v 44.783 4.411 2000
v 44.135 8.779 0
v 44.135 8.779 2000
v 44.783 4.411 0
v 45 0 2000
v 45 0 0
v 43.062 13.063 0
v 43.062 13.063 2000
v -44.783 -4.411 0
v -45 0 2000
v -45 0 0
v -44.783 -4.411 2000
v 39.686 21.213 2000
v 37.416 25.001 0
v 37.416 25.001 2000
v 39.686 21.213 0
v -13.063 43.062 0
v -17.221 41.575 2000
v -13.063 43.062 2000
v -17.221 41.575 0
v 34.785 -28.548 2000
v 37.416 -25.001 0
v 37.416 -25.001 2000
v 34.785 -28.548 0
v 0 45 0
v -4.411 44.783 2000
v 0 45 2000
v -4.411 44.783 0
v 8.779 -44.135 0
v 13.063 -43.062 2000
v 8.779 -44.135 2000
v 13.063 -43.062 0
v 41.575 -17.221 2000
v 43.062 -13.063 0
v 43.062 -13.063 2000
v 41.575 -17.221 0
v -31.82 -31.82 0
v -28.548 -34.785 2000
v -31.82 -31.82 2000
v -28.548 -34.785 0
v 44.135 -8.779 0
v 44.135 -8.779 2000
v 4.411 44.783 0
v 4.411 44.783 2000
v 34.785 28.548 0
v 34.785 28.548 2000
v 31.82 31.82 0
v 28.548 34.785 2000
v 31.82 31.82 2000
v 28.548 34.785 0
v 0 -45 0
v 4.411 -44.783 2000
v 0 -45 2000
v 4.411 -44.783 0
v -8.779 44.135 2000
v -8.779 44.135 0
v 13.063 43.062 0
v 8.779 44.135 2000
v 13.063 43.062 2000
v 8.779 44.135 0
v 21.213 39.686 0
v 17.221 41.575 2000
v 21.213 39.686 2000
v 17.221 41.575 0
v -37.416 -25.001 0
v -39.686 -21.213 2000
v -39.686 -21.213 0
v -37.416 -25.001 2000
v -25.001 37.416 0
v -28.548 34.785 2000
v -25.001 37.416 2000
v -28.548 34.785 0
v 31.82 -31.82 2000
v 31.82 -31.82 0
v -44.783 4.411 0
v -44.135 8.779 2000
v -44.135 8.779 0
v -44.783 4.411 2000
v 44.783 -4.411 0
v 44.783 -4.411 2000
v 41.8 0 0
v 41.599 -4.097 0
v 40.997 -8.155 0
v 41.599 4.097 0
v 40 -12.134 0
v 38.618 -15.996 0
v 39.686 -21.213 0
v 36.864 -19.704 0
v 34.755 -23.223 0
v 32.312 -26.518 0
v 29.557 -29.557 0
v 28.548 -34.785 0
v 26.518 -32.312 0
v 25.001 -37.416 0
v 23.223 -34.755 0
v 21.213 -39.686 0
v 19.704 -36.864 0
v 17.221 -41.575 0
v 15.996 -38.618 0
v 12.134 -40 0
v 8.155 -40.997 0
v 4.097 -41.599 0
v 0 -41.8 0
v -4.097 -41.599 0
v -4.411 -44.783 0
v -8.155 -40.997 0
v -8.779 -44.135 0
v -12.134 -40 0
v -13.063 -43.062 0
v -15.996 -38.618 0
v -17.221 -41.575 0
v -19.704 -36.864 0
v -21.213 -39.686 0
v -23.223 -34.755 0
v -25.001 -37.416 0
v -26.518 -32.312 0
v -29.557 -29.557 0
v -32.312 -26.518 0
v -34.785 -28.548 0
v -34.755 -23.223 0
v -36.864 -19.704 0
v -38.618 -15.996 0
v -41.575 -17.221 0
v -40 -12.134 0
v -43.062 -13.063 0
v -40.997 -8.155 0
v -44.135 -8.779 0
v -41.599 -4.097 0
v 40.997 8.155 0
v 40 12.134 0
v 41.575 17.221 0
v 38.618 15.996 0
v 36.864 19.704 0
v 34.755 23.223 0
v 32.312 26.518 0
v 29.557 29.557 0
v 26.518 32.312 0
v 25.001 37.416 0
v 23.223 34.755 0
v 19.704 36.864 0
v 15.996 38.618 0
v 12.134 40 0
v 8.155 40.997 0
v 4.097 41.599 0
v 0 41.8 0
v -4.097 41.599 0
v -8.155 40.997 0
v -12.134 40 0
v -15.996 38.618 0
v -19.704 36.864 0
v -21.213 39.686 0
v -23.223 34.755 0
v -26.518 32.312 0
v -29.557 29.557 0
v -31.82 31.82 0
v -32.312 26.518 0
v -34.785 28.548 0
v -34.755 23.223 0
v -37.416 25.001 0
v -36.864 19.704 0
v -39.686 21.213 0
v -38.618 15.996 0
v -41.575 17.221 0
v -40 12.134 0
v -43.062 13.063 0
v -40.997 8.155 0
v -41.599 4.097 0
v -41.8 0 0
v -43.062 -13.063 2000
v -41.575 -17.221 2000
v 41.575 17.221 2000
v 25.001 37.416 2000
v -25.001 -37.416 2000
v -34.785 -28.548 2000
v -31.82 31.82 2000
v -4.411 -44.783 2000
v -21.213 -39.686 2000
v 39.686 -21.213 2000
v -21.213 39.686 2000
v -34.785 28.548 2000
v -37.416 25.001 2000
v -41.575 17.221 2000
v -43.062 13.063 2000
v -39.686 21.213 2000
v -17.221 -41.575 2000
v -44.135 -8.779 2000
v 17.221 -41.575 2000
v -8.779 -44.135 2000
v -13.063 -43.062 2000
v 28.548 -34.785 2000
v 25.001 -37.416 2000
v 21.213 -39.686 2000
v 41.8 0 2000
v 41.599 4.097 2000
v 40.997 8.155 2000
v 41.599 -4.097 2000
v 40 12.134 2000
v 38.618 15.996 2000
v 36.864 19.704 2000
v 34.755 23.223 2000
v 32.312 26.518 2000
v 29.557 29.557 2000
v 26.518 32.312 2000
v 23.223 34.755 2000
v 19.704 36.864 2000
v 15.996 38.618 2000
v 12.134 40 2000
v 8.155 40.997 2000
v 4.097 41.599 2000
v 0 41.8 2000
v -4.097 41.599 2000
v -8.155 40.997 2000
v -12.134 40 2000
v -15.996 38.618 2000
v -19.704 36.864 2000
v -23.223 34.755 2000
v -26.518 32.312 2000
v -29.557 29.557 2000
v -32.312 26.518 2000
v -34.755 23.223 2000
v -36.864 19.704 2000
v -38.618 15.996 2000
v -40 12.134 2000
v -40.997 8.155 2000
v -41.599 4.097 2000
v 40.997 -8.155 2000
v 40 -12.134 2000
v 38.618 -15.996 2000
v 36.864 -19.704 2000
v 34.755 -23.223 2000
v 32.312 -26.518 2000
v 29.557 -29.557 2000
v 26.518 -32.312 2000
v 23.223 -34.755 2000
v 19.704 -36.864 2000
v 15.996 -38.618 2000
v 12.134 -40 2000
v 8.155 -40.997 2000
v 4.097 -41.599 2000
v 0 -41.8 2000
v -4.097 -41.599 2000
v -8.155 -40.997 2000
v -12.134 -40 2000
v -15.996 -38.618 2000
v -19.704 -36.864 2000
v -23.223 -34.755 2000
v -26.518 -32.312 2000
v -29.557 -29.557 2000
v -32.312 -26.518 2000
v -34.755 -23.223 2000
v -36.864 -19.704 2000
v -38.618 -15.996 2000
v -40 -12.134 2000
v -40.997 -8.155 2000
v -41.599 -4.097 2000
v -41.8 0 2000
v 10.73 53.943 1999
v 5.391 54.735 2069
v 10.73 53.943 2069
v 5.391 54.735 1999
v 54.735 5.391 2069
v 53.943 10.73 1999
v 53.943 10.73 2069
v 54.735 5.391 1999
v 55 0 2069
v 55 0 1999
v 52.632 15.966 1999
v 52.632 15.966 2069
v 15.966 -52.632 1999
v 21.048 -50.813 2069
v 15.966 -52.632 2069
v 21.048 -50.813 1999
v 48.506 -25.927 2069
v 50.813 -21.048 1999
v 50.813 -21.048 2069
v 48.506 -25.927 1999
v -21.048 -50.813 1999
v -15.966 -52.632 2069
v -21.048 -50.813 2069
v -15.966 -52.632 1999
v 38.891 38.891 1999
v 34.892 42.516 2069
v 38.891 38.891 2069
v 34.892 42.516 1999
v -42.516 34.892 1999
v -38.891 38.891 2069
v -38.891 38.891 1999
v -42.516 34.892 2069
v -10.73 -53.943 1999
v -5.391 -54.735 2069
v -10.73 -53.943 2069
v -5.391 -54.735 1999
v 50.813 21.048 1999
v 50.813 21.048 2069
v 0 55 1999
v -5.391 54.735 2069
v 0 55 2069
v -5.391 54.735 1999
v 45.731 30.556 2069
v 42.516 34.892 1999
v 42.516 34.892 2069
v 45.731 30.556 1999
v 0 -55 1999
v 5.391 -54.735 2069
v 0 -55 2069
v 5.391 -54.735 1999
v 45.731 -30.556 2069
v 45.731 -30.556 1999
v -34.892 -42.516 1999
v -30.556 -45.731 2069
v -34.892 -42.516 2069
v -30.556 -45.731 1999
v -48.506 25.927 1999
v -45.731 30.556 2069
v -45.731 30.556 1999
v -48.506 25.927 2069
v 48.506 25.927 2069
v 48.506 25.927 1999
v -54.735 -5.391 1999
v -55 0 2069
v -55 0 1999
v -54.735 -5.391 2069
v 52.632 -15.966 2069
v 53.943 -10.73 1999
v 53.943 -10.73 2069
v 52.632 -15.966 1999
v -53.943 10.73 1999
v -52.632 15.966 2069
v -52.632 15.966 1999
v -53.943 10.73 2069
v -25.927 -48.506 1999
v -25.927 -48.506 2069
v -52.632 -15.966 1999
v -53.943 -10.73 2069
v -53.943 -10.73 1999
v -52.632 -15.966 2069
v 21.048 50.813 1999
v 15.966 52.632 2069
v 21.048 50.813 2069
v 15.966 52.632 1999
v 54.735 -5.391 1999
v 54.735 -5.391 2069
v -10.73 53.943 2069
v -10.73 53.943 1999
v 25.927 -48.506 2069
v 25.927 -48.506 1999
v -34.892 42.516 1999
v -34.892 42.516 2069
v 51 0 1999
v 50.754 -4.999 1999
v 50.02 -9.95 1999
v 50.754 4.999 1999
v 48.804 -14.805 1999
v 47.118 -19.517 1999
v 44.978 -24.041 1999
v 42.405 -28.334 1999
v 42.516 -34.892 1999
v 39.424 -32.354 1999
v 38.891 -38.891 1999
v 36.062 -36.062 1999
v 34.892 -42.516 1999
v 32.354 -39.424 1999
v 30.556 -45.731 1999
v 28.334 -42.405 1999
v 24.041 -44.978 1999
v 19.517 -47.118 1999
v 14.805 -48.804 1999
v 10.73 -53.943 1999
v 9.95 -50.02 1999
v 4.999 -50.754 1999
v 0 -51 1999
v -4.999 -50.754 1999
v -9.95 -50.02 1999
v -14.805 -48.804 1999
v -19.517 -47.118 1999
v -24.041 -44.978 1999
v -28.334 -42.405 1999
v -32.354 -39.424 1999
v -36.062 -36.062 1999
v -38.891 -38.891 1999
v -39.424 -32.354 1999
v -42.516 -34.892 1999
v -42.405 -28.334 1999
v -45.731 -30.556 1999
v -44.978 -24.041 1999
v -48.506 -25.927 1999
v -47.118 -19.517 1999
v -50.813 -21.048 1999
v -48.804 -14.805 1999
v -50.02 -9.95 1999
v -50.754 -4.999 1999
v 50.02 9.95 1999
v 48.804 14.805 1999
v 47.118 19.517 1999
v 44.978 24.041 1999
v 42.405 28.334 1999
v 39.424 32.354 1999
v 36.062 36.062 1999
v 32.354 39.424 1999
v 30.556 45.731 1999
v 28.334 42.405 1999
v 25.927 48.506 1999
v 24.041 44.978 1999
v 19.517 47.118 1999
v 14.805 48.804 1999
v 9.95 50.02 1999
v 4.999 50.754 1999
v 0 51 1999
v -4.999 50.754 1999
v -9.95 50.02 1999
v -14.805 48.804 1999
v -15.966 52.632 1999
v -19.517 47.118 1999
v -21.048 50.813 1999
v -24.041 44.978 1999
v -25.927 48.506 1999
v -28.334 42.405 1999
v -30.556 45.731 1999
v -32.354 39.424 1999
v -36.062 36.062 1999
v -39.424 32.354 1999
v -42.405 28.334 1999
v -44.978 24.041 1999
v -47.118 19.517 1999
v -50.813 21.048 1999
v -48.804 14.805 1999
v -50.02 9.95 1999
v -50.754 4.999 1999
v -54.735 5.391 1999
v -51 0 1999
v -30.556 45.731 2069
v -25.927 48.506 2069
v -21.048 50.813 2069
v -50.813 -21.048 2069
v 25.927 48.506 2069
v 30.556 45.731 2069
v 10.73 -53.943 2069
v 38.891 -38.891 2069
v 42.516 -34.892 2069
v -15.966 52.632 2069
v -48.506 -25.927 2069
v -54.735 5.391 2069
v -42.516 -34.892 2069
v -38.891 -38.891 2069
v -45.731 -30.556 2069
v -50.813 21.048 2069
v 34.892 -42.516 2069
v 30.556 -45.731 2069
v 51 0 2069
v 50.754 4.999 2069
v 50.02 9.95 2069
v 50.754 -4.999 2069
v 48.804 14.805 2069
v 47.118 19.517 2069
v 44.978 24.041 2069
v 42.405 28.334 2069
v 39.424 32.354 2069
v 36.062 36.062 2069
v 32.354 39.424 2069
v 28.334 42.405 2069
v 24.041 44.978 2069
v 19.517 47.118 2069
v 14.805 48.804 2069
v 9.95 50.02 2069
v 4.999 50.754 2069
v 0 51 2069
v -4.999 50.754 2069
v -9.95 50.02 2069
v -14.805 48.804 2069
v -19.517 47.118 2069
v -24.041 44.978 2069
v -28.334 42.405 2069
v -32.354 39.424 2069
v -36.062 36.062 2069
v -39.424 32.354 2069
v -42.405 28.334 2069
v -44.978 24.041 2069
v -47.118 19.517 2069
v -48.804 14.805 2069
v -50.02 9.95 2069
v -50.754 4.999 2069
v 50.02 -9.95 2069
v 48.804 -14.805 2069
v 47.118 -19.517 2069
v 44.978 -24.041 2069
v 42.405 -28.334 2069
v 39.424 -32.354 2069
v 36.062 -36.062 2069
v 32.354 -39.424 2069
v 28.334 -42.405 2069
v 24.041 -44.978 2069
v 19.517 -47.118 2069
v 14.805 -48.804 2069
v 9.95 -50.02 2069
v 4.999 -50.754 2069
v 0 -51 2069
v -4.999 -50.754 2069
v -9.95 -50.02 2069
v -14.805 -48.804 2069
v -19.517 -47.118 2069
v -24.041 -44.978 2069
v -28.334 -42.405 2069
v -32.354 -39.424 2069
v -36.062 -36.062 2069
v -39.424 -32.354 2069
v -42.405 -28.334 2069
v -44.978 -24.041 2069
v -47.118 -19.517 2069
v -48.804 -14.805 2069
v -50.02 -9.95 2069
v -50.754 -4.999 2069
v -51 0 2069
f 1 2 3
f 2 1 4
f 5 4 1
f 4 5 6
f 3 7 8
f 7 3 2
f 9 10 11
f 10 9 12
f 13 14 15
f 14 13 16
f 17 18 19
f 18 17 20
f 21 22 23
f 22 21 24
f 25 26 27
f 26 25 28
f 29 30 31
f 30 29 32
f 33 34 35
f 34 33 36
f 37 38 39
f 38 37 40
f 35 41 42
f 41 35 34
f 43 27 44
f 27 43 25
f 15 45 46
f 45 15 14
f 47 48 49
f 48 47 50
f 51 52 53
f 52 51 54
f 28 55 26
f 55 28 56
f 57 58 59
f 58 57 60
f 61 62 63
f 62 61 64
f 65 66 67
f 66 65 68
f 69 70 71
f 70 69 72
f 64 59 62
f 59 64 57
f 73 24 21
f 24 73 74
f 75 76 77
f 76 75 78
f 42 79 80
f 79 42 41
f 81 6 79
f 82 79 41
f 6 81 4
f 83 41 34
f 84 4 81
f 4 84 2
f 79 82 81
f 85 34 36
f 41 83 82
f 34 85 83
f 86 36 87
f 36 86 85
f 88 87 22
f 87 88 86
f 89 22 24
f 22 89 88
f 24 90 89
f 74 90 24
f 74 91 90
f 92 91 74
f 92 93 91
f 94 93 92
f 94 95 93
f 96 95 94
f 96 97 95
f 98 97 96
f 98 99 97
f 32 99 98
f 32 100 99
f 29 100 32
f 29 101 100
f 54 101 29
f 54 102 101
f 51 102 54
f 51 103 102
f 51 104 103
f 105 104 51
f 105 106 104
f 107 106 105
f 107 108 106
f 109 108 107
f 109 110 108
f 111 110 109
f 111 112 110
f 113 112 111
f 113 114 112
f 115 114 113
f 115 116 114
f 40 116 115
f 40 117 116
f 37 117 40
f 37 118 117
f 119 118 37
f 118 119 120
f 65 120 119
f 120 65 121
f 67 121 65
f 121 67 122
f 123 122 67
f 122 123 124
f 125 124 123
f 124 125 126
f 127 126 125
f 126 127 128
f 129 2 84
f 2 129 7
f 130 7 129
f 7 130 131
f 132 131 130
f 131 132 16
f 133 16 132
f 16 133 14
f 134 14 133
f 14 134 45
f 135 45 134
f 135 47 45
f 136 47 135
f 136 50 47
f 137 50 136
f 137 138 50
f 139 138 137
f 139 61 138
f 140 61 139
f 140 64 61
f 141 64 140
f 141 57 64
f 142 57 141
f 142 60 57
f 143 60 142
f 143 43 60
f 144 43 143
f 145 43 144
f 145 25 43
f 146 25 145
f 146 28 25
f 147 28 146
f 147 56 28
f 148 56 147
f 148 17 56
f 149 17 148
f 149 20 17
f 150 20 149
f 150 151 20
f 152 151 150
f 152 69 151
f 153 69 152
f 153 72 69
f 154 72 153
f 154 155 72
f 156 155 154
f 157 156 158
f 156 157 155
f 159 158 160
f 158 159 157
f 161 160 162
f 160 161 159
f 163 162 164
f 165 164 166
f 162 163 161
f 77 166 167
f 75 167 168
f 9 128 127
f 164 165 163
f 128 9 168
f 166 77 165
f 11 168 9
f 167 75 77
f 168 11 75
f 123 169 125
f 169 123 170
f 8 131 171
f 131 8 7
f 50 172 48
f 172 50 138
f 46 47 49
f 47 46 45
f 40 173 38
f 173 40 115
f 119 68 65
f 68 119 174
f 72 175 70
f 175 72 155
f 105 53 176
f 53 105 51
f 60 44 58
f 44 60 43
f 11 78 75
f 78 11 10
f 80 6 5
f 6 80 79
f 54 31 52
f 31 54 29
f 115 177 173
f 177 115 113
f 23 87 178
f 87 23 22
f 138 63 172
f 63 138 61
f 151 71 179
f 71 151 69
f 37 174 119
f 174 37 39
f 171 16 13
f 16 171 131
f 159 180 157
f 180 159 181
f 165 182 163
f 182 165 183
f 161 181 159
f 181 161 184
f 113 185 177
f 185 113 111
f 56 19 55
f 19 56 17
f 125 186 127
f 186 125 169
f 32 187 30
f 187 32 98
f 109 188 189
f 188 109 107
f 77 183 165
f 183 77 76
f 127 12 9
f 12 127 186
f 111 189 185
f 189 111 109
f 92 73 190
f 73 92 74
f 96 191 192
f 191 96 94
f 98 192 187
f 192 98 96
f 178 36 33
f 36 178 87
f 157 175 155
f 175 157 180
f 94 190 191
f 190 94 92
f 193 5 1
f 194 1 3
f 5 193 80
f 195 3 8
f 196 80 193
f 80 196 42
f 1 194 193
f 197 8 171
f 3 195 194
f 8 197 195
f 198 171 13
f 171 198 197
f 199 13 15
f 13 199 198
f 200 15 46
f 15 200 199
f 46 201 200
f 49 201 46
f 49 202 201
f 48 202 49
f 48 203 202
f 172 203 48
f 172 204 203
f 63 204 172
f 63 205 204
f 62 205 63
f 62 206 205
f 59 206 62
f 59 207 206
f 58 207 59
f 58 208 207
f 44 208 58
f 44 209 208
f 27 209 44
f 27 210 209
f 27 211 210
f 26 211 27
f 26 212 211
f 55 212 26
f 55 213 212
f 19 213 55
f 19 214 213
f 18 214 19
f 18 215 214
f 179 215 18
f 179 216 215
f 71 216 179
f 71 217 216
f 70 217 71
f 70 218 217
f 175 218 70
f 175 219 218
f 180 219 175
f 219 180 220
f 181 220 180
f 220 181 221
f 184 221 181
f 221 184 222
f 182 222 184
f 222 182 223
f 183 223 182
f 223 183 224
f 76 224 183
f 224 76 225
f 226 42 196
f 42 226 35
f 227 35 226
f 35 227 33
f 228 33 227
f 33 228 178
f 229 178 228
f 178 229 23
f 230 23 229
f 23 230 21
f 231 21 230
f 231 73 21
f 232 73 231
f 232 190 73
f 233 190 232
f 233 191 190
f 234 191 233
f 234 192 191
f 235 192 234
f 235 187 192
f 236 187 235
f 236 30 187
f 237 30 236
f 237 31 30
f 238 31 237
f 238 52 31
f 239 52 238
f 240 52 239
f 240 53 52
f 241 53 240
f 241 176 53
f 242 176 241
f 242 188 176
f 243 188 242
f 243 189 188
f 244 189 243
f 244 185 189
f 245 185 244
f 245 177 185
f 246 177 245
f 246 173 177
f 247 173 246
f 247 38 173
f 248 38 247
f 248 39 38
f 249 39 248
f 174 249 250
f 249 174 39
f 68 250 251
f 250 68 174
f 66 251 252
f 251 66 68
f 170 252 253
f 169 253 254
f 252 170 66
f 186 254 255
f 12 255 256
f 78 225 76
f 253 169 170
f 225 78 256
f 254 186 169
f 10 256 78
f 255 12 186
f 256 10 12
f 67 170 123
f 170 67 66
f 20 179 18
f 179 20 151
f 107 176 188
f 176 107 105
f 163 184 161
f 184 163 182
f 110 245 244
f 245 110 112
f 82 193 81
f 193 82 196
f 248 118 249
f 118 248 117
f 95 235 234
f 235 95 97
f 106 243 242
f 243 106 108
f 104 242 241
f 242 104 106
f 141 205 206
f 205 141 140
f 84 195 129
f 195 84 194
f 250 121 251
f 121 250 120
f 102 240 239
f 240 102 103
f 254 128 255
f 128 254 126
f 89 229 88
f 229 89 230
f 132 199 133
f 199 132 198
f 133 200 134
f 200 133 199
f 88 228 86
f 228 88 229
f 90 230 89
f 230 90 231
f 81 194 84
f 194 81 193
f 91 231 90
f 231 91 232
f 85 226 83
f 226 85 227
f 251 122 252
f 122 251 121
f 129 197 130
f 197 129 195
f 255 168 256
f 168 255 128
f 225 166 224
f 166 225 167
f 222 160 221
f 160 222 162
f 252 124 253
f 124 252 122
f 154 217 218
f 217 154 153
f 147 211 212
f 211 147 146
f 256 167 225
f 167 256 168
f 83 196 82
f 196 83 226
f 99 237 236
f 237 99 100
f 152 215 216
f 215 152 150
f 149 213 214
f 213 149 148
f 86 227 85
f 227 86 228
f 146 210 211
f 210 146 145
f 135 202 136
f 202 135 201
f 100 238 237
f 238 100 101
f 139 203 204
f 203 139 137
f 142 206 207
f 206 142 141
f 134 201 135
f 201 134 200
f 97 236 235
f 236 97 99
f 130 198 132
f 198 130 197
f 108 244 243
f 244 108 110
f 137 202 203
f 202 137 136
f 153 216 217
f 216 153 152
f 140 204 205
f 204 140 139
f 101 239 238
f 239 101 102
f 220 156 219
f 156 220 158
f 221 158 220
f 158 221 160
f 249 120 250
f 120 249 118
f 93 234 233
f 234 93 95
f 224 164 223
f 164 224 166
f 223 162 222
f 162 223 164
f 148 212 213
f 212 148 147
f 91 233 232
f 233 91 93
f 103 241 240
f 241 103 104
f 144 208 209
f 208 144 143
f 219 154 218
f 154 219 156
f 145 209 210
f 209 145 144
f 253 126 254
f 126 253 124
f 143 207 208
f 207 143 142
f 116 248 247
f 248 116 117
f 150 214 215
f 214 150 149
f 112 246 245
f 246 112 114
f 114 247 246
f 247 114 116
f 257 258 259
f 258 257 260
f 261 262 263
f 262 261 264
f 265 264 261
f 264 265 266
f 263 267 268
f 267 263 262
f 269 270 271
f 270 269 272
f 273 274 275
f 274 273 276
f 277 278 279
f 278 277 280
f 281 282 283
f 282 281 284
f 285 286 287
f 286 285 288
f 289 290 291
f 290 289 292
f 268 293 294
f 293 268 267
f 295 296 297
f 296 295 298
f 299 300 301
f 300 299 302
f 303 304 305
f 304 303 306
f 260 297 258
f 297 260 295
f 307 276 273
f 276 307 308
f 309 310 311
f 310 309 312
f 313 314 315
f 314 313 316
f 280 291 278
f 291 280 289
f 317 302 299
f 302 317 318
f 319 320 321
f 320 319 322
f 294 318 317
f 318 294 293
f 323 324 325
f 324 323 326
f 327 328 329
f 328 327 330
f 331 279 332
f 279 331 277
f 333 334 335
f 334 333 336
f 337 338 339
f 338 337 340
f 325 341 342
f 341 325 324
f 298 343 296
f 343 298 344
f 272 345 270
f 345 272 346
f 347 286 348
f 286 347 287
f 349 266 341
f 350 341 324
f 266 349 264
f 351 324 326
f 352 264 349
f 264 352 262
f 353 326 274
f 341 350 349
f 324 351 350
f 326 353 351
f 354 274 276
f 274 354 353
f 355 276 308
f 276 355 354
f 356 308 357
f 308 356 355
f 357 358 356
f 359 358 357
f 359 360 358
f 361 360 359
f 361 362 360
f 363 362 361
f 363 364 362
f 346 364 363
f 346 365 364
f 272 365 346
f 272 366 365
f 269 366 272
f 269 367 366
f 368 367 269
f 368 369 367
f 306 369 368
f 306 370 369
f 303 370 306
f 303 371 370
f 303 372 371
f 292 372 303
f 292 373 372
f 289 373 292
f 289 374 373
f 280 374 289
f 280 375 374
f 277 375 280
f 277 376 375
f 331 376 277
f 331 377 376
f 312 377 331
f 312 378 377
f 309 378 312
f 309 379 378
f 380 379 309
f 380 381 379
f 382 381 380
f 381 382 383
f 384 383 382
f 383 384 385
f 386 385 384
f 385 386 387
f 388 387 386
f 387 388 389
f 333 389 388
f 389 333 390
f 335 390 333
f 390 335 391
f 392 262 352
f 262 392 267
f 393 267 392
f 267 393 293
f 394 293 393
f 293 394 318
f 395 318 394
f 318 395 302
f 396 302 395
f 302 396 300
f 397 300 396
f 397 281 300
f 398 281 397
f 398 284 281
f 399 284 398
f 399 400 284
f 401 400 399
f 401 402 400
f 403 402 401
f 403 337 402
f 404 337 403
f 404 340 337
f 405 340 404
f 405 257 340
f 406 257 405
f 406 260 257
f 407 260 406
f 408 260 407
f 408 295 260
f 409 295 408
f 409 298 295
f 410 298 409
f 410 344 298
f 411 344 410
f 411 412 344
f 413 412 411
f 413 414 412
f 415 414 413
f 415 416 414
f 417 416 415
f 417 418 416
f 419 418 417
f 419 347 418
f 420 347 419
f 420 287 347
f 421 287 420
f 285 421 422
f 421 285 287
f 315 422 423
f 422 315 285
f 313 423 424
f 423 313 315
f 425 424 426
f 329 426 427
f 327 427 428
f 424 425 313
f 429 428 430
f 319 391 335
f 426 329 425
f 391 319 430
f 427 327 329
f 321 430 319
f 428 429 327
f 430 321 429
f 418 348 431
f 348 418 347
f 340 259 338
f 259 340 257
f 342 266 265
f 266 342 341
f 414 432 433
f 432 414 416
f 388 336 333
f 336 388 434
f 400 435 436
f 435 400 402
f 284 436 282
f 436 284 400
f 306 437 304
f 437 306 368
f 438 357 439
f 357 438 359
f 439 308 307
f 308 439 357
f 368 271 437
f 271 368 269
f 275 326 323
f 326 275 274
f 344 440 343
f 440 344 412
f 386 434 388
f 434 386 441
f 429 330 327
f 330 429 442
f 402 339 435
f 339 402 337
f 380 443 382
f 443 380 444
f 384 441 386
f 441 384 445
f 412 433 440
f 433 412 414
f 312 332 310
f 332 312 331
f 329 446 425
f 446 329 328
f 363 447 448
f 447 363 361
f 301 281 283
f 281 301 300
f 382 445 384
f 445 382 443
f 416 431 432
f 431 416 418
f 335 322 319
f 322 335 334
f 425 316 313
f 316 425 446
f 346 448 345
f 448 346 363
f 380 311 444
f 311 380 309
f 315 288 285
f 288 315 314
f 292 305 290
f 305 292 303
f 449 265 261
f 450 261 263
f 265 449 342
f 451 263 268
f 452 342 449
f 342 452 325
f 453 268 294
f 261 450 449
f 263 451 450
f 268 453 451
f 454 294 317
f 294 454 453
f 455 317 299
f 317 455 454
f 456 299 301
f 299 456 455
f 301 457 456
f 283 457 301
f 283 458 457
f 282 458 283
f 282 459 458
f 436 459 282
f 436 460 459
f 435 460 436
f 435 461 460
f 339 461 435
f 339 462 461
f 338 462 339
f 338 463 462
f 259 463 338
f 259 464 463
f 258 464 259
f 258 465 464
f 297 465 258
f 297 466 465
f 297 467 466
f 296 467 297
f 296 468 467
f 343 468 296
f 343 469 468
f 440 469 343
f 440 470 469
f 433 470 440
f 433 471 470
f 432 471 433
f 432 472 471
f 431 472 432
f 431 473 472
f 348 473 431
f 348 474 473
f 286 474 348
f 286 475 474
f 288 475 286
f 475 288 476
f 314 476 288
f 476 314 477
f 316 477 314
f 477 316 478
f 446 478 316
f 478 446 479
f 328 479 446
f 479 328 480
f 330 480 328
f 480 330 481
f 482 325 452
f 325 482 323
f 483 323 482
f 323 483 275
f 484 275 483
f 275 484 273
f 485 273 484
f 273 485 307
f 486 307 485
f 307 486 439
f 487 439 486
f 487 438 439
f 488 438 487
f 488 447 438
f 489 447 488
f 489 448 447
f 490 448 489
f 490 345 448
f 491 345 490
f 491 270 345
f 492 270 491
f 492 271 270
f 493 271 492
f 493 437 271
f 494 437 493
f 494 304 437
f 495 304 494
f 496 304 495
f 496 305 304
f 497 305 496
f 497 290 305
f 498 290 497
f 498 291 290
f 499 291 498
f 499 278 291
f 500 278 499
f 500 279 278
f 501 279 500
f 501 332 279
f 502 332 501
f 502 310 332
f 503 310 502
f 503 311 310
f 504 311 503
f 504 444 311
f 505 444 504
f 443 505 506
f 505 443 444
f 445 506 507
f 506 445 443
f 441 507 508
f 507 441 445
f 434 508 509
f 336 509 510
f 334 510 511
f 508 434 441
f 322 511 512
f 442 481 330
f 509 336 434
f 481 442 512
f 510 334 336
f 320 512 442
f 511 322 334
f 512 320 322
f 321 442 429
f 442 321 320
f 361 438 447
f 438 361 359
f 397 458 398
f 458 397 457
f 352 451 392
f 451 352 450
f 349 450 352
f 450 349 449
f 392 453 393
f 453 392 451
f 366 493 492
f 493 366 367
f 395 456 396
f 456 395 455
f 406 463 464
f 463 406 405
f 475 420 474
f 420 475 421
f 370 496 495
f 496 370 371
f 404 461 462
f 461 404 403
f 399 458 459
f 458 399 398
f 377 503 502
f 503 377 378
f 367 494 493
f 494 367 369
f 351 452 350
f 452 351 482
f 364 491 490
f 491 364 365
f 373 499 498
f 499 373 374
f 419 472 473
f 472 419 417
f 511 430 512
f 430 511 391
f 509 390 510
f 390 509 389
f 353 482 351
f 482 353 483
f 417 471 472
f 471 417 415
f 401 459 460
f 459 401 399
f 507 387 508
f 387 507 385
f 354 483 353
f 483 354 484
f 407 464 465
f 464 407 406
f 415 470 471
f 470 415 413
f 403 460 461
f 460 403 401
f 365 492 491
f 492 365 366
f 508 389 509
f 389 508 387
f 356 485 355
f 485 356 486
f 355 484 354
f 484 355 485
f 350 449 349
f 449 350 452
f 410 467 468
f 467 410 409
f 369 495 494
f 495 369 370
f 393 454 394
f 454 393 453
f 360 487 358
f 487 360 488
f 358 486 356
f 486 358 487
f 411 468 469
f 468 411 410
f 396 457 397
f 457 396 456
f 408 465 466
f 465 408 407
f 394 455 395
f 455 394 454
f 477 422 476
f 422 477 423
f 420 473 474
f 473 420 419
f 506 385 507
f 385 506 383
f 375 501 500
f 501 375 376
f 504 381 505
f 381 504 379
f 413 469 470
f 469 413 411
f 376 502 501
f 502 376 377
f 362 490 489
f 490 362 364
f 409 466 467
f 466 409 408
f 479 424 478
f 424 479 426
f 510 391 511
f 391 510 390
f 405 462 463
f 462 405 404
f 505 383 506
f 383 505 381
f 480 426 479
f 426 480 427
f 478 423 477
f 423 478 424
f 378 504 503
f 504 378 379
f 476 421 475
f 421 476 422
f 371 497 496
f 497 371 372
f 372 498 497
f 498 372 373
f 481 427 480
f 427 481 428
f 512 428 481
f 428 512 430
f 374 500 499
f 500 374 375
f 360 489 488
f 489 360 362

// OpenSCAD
// Parameters
length_mm = 2000; //[1000:4000:10]
outer_diameter_mm = 90; //[45:180:1]
wall_thickness_mm = 3.2; //[1.6:6.4:0.1]
socket_length_mm = 70; //[35:140:1]
socket_outer_diameter_mm = 110; //[95:140:1]
socket_wall_thickness_mm = 4; //[2:8:0.1]
socket_insert_depth_mm = 55; //[30:110:1]
socket_stop_thickness_mm = 3; //[1:8:0.1]
overlap_mm = 1; //[0.5:2:0.1]
include_end_fitting = 1; //[0:1:1]

// HT Pipe Body
module ht_pipe_body() {
  color([0.85, 0.85, 0.8]) {
    difference() {
      // Outer pipe
      translate([0, 0, 0])
        cylinder(h=length_mm, r=outer_diameter_mm/2, center=false, $fn=64);
      // Inner void
      translate([0, 0, -overlap_mm/2])
        cylinder(h=length_mm + overlap_mm, r=outer_diameter_mm/2 - wall_thickness_mm, center=false, $fn=64);
    }
  }
}

// End Fitting Socket
module end_fitting_socket() {
  color([0.85, 0.85, 0.8]) {
    difference() {
      // Outer socket
      translate([0, 0, length_mm - overlap_mm])
        cylinder(h=socket_length_mm, r=socket_outer_diameter_mm/2, center=false, $fn=64);
      // Inner void
      translate([0, 0, length_mm - overlap_mm - overlap_mm/2])
        cylinder(h=socket_length_mm + overlap_mm, r=socket_outer_diameter_mm/2 - socket_wall_thickness_mm, center=false, $fn=64);
      // Insert bore
      translate([0, 0, length_mm - overlap_mm])
        cylinder(h=socket_insert_depth_mm, r=outer_diameter_mm/2 + overlap_mm, center=false, $fn=64);
      // Stop relief
      translate([0, 0, length_mm - overlap_mm + socket_insert_depth_mm - overlap_mm/2])
        cylinder(h=socket_stop_thickness_mm + overlap_mm, r=outer_diameter_mm/2 - wall_thickness_mm, center=false, $fn=64);
    }
  }
}

// HT Pipe with optional end fitting
module ht_pipe() {
  if (include_end_fitting) {
    union() {
      ht_pipe_body();
      end_fitting_socket();
    }
  } else {
    ht_pipe_body();
  }
}

// Assembly
module assembly() {
  ht_pipe();
}

assembly();
